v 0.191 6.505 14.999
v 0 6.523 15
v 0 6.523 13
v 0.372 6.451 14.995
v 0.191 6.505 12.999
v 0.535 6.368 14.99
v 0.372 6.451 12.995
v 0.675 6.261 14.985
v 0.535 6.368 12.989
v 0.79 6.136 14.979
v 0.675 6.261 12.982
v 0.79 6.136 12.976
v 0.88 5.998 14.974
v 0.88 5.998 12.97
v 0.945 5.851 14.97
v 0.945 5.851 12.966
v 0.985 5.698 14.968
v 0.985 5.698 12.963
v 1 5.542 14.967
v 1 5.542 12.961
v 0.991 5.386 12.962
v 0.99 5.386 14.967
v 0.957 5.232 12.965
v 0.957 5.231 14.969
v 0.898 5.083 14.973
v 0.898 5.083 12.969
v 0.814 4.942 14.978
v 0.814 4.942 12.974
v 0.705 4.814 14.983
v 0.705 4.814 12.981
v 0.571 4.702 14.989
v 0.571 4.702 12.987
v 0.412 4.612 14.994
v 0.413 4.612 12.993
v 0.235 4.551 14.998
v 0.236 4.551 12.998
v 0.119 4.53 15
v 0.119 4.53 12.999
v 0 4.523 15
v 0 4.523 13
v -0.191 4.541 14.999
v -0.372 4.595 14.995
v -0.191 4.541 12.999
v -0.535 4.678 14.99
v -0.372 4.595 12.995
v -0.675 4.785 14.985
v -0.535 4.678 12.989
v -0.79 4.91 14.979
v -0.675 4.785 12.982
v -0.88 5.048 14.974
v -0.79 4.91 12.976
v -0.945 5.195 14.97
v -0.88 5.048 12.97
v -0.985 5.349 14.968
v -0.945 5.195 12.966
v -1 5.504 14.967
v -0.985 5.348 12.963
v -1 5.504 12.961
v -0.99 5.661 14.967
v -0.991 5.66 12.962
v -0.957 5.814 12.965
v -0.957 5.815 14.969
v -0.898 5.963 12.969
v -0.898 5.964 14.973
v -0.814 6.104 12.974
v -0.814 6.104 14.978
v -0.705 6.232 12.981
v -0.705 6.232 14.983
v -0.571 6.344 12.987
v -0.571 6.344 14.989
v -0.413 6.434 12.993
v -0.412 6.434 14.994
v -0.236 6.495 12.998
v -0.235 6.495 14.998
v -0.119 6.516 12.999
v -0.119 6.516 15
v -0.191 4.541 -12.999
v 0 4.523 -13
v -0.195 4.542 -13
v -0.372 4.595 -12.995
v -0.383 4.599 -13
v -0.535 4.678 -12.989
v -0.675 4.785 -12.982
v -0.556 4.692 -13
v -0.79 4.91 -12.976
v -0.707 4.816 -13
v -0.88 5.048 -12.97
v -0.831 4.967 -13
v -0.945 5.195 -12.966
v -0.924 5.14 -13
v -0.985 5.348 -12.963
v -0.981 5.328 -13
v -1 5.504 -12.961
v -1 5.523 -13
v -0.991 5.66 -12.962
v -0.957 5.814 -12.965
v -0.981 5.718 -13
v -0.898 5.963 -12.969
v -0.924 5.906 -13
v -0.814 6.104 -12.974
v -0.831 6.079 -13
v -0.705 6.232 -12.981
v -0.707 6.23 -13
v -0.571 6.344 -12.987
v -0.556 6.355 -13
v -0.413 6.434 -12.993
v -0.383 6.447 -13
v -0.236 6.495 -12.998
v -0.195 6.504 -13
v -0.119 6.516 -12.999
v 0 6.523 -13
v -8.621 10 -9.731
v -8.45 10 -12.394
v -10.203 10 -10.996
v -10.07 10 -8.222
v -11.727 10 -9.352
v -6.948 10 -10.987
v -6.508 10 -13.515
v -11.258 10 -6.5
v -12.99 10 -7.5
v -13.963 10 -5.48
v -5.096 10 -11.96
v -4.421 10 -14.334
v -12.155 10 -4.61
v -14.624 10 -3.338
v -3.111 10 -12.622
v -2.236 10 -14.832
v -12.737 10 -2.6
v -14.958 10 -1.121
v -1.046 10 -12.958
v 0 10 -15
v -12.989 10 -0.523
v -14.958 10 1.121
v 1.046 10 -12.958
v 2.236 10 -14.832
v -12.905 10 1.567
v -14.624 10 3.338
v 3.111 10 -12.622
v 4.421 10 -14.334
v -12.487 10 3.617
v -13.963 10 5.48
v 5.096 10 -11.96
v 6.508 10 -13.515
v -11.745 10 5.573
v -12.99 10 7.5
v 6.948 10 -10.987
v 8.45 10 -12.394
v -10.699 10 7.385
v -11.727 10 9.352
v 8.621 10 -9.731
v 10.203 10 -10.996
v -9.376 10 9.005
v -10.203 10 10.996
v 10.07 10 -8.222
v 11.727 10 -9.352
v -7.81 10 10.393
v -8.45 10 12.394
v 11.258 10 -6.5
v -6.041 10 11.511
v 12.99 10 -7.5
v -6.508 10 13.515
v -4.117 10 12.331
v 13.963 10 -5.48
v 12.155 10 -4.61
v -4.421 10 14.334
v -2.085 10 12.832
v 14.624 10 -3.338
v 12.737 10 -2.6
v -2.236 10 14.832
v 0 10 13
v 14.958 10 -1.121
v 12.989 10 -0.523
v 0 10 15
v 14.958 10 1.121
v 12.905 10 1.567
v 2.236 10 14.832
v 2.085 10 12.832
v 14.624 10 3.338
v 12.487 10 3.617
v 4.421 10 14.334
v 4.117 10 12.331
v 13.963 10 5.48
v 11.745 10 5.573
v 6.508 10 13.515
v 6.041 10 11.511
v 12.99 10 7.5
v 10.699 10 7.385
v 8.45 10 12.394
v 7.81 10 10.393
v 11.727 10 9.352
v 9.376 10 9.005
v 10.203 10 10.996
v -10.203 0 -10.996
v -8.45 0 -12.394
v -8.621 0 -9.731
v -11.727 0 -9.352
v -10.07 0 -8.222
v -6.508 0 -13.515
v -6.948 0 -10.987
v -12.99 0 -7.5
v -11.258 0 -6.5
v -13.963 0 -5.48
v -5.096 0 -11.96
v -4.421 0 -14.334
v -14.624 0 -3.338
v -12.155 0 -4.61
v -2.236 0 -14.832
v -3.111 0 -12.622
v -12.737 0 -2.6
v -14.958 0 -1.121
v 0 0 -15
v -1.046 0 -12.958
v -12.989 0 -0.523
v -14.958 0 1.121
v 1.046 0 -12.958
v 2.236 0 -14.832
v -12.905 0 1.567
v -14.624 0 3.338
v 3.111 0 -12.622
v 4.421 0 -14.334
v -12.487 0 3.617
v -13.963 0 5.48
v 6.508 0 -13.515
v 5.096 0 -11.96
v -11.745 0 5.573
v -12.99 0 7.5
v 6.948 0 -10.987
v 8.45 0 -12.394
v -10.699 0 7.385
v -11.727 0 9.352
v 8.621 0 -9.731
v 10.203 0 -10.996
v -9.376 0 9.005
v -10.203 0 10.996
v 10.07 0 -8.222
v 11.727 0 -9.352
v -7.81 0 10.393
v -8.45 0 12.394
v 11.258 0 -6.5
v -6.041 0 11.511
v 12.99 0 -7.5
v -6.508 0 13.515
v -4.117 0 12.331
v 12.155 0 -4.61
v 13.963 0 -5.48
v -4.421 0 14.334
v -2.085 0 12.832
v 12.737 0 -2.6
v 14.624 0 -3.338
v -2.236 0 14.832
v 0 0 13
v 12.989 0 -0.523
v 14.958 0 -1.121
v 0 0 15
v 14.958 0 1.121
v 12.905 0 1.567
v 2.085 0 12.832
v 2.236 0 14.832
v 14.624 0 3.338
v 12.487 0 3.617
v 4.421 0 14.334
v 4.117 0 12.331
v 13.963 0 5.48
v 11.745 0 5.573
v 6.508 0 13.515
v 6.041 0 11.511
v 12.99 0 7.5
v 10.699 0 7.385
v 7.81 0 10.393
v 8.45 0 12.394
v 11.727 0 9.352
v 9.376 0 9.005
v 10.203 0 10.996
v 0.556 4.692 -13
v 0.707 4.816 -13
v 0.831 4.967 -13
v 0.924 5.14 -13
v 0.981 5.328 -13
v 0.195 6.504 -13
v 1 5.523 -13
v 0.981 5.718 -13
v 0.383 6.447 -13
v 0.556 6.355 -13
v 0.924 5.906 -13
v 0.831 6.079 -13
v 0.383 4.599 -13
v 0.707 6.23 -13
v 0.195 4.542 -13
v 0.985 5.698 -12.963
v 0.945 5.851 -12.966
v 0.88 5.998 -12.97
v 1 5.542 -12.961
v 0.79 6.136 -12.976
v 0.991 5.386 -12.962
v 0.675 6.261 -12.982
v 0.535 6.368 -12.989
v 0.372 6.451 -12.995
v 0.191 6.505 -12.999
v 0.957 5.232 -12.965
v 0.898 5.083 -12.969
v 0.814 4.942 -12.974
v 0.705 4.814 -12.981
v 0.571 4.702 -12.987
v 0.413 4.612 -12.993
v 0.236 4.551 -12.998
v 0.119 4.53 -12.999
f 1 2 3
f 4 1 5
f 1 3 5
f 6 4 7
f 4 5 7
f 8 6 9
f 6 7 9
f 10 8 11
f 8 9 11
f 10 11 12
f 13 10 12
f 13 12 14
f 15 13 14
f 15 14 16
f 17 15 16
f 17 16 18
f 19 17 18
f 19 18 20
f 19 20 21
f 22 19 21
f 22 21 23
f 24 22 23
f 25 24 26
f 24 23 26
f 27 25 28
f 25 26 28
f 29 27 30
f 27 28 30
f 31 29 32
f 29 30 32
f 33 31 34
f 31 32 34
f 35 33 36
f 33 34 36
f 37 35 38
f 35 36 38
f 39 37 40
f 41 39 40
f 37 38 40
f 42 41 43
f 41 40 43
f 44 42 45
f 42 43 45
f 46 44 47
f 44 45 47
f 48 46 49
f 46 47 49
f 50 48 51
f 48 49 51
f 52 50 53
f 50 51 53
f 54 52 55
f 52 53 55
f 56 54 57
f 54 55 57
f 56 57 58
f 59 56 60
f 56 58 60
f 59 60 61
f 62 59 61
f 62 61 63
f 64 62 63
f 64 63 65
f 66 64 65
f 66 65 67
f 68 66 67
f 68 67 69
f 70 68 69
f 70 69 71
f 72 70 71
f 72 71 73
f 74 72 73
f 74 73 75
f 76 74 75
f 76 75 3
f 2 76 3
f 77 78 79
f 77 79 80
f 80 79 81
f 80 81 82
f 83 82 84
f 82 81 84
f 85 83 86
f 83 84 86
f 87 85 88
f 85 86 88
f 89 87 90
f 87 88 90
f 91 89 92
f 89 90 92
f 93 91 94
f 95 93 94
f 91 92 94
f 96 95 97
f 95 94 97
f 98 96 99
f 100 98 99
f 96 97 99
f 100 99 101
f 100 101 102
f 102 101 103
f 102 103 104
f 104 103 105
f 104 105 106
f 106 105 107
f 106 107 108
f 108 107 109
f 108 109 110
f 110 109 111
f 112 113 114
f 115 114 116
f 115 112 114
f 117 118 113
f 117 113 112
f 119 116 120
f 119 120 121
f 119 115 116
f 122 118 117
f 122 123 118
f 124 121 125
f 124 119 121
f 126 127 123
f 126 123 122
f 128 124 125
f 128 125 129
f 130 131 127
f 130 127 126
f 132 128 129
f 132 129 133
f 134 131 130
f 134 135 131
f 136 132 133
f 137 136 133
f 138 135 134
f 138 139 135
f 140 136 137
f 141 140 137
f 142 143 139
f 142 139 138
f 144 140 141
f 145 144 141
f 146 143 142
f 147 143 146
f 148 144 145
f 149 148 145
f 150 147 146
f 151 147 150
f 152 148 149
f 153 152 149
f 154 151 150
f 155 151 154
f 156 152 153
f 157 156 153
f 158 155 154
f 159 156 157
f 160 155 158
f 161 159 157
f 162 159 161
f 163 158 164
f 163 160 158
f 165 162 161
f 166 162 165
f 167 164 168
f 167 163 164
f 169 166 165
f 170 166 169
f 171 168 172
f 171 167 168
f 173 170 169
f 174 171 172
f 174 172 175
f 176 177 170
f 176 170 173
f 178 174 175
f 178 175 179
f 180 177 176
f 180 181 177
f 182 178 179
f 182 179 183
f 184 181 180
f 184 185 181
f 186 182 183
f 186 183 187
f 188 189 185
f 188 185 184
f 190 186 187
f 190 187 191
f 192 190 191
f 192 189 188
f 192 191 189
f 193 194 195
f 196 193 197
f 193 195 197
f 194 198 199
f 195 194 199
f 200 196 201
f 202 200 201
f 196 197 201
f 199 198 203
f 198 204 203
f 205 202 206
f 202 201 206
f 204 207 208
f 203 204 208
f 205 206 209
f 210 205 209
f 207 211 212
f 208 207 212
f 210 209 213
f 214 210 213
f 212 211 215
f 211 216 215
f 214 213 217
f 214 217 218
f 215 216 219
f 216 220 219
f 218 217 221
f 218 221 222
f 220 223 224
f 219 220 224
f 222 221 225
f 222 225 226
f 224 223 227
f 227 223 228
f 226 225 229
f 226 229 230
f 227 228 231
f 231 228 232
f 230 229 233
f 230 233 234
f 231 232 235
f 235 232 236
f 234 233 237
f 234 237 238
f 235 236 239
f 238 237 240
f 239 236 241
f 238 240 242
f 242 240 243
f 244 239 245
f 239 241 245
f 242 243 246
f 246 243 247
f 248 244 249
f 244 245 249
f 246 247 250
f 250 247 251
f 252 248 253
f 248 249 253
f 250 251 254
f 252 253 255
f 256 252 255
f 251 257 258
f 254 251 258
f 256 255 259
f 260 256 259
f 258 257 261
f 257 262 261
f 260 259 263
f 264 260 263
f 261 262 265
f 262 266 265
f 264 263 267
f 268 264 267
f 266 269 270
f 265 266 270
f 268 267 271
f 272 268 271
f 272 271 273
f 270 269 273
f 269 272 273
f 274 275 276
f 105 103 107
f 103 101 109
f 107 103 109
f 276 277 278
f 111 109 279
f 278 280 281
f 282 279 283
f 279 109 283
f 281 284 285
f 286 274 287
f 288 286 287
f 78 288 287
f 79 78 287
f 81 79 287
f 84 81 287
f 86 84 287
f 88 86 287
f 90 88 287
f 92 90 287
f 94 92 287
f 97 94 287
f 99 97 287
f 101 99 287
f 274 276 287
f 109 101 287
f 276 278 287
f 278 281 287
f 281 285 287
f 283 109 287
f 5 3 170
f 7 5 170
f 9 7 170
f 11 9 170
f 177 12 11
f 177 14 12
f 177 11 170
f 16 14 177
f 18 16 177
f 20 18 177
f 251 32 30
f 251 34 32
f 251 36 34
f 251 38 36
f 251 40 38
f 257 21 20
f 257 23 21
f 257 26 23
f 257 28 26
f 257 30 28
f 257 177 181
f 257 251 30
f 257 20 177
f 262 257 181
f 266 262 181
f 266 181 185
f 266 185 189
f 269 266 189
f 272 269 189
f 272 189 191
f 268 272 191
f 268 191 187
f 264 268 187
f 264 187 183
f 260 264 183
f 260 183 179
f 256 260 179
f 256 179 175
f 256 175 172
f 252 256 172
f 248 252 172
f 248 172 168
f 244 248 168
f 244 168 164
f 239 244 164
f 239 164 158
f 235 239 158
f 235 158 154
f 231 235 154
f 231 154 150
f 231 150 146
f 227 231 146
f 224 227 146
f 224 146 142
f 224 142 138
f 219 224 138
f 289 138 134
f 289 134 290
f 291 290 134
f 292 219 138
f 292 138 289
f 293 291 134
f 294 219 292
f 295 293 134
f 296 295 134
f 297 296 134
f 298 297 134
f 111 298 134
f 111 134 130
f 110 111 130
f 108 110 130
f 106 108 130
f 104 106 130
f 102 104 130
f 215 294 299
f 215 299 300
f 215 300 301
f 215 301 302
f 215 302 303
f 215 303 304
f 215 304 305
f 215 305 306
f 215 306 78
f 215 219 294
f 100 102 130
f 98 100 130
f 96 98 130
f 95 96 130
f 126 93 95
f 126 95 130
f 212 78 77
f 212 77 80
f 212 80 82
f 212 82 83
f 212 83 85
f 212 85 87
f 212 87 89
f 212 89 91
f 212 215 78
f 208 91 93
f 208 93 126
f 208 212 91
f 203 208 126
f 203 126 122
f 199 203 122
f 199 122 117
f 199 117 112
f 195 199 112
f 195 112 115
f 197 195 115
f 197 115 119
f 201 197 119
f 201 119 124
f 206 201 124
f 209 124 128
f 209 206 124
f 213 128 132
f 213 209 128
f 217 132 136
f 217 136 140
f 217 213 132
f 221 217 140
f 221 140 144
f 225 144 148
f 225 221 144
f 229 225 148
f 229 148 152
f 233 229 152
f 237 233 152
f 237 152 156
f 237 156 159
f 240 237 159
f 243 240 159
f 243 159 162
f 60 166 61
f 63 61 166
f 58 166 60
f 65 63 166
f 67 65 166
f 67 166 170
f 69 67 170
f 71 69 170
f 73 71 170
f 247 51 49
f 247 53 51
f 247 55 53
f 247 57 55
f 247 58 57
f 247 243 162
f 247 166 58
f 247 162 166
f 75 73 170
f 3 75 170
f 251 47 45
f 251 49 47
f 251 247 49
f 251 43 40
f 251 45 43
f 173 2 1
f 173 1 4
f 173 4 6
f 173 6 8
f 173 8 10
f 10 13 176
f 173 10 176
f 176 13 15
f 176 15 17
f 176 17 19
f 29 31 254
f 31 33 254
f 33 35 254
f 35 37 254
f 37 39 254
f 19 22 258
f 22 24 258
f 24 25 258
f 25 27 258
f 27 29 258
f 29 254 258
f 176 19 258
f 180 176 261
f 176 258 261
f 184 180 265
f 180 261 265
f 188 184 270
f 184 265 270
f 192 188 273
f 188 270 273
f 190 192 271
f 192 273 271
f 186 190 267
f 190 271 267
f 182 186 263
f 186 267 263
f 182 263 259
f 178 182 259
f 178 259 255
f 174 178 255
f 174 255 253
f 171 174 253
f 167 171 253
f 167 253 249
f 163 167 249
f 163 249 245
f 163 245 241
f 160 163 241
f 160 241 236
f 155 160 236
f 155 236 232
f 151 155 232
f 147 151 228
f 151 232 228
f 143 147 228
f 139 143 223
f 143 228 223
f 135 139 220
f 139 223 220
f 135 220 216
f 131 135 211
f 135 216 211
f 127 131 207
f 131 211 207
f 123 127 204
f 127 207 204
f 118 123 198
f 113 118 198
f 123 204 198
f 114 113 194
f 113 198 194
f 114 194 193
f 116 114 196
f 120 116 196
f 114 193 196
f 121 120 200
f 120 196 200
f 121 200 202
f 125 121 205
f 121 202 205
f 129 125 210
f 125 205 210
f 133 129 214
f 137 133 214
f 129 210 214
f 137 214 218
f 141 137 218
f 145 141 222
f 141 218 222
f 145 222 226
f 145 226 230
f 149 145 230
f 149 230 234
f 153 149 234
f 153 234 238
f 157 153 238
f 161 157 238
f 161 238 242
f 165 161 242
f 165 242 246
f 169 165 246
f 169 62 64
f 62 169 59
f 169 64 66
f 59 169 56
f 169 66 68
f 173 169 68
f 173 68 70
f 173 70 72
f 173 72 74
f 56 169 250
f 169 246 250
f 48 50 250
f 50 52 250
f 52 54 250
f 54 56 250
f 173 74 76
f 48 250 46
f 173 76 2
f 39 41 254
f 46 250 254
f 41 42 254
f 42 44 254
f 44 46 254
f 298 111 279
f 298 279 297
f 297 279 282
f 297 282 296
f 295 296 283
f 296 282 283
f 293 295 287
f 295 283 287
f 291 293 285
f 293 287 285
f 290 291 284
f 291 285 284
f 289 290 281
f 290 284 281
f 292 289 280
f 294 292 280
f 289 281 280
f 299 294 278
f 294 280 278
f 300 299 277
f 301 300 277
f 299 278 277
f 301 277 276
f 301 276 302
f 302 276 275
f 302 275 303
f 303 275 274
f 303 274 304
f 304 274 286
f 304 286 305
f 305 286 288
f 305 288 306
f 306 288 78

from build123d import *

# Parameters (mm, degrees)
SKETCH_1_R          = 15
SKETCH_1_R_2        = 13
EXTRUDE_1_DEPTH     = 10
SKETCH_2_R          = 1
CUT_EXTRUDE_1_DEPTH = 34.301651611


with BuildPart() as part:
    # 草图1 → 凸台-拉伸1 (new body)
    with BuildSketch(Plane(origin=(0, 0, 0), x_dir=(1, 0, 0), z_dir=(0, 1, 0))):
        with Locations(Location((0, 0, 0), (0, 0, 270))):
            Circle(SKETCH_1_R)
        with Locations(Location((0, 0, 0), (0, 0, 270))):
            Circle(SKETCH_1_R_2, mode=Mode.SUBTRACT)
    extrude(amount=EXTRUDE_1_DEPTH)

    # 草图2 → 切除-拉伸1 (cut, through all)
    with BuildSketch(Plane(origin=(0, 0, -13), x_dir=(-1, 0, 0), z_dir=(0, 0, -1))):
        with Locations(Location((0, 5.523046221, 0), (0, 0, 90.000000034))):
            Circle(SKETCH_2_R)
    extrude(amount=-CUT_EXTRUDE_1_DEPTH, mode=Mode.SUBTRACT)


solid = part.part
